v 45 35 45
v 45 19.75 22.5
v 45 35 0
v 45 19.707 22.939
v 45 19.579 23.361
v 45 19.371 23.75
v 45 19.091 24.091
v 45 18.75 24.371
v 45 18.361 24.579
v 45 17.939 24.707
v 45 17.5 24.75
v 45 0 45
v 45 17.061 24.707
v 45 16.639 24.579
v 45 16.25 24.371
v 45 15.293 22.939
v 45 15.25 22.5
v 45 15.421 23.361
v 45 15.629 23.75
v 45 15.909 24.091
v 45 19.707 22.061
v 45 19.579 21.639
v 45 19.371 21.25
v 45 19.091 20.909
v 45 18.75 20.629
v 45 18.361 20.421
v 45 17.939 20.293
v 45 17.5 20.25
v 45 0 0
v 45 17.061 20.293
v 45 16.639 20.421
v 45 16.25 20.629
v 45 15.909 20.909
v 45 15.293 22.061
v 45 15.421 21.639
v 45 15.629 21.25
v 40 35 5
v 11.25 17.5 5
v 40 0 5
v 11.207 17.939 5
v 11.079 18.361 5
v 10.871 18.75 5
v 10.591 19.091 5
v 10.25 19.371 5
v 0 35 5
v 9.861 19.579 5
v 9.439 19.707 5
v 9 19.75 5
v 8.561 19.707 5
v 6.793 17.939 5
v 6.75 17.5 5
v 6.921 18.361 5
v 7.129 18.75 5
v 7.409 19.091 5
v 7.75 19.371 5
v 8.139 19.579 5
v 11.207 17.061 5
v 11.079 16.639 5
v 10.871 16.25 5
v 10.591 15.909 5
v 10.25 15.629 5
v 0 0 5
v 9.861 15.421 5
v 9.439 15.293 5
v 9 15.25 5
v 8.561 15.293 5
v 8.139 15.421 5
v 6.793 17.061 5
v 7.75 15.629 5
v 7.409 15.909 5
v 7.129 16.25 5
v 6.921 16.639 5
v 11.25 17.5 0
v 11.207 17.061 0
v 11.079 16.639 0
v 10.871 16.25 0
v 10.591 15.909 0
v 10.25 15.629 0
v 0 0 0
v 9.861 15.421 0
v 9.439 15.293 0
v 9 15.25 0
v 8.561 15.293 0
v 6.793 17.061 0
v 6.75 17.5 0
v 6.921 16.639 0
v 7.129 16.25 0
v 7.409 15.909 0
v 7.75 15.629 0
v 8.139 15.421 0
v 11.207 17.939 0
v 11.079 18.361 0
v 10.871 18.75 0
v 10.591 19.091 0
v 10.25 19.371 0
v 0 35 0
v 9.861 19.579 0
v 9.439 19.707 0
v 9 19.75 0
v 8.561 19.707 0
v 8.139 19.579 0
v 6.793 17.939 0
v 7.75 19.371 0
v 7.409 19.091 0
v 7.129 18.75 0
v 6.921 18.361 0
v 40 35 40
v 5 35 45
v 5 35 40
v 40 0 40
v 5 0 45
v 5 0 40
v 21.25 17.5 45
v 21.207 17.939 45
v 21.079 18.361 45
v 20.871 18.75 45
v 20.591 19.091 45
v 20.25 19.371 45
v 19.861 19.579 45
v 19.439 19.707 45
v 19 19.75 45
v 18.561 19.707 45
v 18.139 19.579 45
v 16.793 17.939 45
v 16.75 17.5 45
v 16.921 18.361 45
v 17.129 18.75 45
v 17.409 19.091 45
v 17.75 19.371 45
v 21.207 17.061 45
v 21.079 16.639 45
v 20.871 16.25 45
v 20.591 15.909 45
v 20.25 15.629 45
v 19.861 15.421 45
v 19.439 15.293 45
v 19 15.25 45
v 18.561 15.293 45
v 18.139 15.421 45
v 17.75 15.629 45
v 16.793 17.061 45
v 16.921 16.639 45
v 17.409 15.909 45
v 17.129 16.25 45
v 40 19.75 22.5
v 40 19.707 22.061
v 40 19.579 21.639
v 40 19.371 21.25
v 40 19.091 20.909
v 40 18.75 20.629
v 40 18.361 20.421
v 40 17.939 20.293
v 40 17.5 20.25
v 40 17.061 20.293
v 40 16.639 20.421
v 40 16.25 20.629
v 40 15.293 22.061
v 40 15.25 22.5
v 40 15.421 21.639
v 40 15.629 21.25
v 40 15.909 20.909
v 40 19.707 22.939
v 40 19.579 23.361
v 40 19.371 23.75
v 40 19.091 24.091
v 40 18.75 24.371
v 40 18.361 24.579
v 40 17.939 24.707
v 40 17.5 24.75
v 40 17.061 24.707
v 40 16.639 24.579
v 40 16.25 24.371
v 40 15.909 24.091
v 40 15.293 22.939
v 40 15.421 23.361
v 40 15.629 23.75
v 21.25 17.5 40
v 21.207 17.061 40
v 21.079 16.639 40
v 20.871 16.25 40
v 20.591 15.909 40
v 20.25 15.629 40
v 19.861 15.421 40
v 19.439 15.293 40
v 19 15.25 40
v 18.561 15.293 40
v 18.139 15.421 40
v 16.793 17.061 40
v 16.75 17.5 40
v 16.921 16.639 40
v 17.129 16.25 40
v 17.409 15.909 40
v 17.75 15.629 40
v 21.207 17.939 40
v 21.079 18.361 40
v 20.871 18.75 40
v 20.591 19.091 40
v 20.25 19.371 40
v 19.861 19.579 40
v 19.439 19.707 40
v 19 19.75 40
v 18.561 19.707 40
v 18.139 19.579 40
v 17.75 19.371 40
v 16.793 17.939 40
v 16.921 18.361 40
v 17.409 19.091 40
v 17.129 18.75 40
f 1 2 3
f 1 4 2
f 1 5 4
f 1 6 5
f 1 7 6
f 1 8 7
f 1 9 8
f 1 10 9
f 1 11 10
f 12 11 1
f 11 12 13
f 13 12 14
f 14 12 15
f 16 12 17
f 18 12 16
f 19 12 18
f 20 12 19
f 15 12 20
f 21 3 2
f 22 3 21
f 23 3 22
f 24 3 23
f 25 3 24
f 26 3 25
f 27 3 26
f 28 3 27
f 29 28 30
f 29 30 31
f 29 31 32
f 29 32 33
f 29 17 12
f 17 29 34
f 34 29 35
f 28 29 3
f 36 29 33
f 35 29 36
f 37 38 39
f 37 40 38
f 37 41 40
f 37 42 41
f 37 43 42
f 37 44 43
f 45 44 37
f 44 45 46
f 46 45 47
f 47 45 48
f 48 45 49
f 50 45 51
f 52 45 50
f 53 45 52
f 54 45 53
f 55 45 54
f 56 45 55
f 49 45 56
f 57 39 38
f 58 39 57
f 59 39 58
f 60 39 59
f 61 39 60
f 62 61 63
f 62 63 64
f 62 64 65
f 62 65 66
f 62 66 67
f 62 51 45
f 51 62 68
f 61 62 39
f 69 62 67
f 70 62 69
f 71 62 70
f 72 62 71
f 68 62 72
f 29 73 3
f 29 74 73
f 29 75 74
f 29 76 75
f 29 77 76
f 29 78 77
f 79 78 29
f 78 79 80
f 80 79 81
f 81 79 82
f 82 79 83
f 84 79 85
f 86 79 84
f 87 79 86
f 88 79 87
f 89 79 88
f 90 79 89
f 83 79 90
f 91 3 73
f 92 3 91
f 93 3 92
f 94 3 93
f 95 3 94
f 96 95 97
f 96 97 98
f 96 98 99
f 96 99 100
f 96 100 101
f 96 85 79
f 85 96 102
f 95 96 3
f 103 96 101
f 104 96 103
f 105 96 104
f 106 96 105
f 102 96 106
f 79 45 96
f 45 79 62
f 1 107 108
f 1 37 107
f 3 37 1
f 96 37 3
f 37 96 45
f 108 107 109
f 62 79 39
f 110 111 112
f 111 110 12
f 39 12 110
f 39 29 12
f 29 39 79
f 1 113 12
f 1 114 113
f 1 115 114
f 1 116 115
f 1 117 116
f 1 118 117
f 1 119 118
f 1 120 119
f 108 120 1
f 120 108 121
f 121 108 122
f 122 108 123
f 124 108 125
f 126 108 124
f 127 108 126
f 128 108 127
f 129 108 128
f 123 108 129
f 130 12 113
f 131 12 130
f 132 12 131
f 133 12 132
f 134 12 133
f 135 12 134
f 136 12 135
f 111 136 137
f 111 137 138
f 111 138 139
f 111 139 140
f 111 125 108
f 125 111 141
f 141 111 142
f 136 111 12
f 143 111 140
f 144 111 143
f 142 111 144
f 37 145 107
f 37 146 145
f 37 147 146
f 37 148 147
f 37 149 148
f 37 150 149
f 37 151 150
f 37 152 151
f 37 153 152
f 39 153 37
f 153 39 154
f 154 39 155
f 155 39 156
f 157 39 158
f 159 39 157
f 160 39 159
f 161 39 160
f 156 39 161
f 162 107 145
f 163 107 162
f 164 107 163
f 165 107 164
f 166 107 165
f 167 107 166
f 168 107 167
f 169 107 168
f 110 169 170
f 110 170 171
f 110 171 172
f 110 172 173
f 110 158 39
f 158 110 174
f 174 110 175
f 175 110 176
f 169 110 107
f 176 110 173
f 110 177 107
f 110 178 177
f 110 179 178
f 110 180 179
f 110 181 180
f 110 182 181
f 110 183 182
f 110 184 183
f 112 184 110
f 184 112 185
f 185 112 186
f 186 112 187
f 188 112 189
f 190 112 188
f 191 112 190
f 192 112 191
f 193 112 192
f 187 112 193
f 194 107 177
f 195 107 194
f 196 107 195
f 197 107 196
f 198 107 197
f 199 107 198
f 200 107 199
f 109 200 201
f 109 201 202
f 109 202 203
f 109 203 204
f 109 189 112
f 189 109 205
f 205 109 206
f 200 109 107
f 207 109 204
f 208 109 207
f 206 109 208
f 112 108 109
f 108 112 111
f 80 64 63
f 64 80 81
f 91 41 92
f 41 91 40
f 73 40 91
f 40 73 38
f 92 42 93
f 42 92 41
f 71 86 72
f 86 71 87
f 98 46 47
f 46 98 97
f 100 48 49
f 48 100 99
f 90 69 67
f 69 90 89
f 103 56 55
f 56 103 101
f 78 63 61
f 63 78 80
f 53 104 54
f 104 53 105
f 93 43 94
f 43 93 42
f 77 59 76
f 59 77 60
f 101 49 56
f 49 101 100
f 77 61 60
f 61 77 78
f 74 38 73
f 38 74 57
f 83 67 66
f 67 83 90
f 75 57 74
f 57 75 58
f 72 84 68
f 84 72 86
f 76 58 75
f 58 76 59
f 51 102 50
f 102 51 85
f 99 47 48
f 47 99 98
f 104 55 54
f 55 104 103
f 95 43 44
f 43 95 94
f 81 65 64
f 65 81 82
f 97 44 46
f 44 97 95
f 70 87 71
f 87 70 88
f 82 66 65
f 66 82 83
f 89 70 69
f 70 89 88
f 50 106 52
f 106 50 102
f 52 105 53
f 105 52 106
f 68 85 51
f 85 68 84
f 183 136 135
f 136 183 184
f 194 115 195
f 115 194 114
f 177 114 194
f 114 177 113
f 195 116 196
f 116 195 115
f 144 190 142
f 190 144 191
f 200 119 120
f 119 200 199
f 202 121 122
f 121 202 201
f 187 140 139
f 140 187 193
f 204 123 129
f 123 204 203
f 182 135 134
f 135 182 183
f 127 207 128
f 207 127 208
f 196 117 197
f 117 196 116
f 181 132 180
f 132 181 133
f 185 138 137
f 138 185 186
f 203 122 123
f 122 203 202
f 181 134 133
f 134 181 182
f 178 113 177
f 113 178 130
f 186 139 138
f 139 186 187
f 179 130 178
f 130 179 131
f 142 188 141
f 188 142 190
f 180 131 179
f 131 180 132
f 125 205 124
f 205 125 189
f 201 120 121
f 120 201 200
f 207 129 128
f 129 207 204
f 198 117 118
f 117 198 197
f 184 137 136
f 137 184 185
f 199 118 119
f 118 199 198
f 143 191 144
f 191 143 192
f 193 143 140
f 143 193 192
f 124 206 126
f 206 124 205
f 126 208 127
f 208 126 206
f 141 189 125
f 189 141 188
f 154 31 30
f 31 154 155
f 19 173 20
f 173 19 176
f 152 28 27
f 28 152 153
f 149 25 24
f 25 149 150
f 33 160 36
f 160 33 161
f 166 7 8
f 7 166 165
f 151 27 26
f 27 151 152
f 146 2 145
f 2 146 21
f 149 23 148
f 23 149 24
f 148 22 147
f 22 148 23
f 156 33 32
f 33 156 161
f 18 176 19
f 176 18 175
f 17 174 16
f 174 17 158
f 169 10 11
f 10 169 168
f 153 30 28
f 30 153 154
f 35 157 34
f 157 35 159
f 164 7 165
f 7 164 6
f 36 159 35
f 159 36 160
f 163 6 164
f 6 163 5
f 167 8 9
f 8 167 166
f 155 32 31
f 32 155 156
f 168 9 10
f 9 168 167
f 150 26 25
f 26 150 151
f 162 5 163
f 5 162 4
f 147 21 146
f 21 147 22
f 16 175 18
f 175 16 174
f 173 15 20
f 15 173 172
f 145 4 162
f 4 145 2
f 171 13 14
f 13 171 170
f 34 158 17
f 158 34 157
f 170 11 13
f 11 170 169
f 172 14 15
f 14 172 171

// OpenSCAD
$fn = 32;

// ----------------------------------------------------------------------
// Z-bracket: 45 x 35 x 45 mm
// ----------------------------------------------------------------------

// --- parameters (mm) ---
foot_len = 45;            // lower foot length, X
top_len = 35;             // upper foot length, X
depth = 35;               // bracket width, Y
step_h = 45;              // overall rise, Z
plate_t = 5;              // plate thickness
hole_d = 4.5;             // clearance for M4

module hole_z(px, py, z0) {
  translate([px, py, z0 - 2.5]) cylinder(h = plate_t + 5, d = hole_d);
}
module hole_x(py, pz) {
  translate([-2.5, py, pz]) rotate([0, 90, 0]) cylinder(h = plate_t + 5, d = hole_d);
}

difference() {
  union() {
    cube([foot_len, depth, plate_t]);
    /* web, overlapping the lower foot */
    translate([foot_len - plate_t, 0, 0]) cube([plate_t, depth, step_h]);
    /* upper foot, sunk into the web */
    translate([foot_len - plate_t - top_len, 0, step_h - plate_t]) cube([top_len + plate_t, depth, plate_t]);
  }
  hole_z(9, 17.5, 0);
  translate([foot_len - plate_t - 21, 0, 0]) hole_z(0, 17.5, step_h - plate_t);
  translate([foot_len - plate_t, 0, 0]) hole_x(17.5, 22.5);
}
